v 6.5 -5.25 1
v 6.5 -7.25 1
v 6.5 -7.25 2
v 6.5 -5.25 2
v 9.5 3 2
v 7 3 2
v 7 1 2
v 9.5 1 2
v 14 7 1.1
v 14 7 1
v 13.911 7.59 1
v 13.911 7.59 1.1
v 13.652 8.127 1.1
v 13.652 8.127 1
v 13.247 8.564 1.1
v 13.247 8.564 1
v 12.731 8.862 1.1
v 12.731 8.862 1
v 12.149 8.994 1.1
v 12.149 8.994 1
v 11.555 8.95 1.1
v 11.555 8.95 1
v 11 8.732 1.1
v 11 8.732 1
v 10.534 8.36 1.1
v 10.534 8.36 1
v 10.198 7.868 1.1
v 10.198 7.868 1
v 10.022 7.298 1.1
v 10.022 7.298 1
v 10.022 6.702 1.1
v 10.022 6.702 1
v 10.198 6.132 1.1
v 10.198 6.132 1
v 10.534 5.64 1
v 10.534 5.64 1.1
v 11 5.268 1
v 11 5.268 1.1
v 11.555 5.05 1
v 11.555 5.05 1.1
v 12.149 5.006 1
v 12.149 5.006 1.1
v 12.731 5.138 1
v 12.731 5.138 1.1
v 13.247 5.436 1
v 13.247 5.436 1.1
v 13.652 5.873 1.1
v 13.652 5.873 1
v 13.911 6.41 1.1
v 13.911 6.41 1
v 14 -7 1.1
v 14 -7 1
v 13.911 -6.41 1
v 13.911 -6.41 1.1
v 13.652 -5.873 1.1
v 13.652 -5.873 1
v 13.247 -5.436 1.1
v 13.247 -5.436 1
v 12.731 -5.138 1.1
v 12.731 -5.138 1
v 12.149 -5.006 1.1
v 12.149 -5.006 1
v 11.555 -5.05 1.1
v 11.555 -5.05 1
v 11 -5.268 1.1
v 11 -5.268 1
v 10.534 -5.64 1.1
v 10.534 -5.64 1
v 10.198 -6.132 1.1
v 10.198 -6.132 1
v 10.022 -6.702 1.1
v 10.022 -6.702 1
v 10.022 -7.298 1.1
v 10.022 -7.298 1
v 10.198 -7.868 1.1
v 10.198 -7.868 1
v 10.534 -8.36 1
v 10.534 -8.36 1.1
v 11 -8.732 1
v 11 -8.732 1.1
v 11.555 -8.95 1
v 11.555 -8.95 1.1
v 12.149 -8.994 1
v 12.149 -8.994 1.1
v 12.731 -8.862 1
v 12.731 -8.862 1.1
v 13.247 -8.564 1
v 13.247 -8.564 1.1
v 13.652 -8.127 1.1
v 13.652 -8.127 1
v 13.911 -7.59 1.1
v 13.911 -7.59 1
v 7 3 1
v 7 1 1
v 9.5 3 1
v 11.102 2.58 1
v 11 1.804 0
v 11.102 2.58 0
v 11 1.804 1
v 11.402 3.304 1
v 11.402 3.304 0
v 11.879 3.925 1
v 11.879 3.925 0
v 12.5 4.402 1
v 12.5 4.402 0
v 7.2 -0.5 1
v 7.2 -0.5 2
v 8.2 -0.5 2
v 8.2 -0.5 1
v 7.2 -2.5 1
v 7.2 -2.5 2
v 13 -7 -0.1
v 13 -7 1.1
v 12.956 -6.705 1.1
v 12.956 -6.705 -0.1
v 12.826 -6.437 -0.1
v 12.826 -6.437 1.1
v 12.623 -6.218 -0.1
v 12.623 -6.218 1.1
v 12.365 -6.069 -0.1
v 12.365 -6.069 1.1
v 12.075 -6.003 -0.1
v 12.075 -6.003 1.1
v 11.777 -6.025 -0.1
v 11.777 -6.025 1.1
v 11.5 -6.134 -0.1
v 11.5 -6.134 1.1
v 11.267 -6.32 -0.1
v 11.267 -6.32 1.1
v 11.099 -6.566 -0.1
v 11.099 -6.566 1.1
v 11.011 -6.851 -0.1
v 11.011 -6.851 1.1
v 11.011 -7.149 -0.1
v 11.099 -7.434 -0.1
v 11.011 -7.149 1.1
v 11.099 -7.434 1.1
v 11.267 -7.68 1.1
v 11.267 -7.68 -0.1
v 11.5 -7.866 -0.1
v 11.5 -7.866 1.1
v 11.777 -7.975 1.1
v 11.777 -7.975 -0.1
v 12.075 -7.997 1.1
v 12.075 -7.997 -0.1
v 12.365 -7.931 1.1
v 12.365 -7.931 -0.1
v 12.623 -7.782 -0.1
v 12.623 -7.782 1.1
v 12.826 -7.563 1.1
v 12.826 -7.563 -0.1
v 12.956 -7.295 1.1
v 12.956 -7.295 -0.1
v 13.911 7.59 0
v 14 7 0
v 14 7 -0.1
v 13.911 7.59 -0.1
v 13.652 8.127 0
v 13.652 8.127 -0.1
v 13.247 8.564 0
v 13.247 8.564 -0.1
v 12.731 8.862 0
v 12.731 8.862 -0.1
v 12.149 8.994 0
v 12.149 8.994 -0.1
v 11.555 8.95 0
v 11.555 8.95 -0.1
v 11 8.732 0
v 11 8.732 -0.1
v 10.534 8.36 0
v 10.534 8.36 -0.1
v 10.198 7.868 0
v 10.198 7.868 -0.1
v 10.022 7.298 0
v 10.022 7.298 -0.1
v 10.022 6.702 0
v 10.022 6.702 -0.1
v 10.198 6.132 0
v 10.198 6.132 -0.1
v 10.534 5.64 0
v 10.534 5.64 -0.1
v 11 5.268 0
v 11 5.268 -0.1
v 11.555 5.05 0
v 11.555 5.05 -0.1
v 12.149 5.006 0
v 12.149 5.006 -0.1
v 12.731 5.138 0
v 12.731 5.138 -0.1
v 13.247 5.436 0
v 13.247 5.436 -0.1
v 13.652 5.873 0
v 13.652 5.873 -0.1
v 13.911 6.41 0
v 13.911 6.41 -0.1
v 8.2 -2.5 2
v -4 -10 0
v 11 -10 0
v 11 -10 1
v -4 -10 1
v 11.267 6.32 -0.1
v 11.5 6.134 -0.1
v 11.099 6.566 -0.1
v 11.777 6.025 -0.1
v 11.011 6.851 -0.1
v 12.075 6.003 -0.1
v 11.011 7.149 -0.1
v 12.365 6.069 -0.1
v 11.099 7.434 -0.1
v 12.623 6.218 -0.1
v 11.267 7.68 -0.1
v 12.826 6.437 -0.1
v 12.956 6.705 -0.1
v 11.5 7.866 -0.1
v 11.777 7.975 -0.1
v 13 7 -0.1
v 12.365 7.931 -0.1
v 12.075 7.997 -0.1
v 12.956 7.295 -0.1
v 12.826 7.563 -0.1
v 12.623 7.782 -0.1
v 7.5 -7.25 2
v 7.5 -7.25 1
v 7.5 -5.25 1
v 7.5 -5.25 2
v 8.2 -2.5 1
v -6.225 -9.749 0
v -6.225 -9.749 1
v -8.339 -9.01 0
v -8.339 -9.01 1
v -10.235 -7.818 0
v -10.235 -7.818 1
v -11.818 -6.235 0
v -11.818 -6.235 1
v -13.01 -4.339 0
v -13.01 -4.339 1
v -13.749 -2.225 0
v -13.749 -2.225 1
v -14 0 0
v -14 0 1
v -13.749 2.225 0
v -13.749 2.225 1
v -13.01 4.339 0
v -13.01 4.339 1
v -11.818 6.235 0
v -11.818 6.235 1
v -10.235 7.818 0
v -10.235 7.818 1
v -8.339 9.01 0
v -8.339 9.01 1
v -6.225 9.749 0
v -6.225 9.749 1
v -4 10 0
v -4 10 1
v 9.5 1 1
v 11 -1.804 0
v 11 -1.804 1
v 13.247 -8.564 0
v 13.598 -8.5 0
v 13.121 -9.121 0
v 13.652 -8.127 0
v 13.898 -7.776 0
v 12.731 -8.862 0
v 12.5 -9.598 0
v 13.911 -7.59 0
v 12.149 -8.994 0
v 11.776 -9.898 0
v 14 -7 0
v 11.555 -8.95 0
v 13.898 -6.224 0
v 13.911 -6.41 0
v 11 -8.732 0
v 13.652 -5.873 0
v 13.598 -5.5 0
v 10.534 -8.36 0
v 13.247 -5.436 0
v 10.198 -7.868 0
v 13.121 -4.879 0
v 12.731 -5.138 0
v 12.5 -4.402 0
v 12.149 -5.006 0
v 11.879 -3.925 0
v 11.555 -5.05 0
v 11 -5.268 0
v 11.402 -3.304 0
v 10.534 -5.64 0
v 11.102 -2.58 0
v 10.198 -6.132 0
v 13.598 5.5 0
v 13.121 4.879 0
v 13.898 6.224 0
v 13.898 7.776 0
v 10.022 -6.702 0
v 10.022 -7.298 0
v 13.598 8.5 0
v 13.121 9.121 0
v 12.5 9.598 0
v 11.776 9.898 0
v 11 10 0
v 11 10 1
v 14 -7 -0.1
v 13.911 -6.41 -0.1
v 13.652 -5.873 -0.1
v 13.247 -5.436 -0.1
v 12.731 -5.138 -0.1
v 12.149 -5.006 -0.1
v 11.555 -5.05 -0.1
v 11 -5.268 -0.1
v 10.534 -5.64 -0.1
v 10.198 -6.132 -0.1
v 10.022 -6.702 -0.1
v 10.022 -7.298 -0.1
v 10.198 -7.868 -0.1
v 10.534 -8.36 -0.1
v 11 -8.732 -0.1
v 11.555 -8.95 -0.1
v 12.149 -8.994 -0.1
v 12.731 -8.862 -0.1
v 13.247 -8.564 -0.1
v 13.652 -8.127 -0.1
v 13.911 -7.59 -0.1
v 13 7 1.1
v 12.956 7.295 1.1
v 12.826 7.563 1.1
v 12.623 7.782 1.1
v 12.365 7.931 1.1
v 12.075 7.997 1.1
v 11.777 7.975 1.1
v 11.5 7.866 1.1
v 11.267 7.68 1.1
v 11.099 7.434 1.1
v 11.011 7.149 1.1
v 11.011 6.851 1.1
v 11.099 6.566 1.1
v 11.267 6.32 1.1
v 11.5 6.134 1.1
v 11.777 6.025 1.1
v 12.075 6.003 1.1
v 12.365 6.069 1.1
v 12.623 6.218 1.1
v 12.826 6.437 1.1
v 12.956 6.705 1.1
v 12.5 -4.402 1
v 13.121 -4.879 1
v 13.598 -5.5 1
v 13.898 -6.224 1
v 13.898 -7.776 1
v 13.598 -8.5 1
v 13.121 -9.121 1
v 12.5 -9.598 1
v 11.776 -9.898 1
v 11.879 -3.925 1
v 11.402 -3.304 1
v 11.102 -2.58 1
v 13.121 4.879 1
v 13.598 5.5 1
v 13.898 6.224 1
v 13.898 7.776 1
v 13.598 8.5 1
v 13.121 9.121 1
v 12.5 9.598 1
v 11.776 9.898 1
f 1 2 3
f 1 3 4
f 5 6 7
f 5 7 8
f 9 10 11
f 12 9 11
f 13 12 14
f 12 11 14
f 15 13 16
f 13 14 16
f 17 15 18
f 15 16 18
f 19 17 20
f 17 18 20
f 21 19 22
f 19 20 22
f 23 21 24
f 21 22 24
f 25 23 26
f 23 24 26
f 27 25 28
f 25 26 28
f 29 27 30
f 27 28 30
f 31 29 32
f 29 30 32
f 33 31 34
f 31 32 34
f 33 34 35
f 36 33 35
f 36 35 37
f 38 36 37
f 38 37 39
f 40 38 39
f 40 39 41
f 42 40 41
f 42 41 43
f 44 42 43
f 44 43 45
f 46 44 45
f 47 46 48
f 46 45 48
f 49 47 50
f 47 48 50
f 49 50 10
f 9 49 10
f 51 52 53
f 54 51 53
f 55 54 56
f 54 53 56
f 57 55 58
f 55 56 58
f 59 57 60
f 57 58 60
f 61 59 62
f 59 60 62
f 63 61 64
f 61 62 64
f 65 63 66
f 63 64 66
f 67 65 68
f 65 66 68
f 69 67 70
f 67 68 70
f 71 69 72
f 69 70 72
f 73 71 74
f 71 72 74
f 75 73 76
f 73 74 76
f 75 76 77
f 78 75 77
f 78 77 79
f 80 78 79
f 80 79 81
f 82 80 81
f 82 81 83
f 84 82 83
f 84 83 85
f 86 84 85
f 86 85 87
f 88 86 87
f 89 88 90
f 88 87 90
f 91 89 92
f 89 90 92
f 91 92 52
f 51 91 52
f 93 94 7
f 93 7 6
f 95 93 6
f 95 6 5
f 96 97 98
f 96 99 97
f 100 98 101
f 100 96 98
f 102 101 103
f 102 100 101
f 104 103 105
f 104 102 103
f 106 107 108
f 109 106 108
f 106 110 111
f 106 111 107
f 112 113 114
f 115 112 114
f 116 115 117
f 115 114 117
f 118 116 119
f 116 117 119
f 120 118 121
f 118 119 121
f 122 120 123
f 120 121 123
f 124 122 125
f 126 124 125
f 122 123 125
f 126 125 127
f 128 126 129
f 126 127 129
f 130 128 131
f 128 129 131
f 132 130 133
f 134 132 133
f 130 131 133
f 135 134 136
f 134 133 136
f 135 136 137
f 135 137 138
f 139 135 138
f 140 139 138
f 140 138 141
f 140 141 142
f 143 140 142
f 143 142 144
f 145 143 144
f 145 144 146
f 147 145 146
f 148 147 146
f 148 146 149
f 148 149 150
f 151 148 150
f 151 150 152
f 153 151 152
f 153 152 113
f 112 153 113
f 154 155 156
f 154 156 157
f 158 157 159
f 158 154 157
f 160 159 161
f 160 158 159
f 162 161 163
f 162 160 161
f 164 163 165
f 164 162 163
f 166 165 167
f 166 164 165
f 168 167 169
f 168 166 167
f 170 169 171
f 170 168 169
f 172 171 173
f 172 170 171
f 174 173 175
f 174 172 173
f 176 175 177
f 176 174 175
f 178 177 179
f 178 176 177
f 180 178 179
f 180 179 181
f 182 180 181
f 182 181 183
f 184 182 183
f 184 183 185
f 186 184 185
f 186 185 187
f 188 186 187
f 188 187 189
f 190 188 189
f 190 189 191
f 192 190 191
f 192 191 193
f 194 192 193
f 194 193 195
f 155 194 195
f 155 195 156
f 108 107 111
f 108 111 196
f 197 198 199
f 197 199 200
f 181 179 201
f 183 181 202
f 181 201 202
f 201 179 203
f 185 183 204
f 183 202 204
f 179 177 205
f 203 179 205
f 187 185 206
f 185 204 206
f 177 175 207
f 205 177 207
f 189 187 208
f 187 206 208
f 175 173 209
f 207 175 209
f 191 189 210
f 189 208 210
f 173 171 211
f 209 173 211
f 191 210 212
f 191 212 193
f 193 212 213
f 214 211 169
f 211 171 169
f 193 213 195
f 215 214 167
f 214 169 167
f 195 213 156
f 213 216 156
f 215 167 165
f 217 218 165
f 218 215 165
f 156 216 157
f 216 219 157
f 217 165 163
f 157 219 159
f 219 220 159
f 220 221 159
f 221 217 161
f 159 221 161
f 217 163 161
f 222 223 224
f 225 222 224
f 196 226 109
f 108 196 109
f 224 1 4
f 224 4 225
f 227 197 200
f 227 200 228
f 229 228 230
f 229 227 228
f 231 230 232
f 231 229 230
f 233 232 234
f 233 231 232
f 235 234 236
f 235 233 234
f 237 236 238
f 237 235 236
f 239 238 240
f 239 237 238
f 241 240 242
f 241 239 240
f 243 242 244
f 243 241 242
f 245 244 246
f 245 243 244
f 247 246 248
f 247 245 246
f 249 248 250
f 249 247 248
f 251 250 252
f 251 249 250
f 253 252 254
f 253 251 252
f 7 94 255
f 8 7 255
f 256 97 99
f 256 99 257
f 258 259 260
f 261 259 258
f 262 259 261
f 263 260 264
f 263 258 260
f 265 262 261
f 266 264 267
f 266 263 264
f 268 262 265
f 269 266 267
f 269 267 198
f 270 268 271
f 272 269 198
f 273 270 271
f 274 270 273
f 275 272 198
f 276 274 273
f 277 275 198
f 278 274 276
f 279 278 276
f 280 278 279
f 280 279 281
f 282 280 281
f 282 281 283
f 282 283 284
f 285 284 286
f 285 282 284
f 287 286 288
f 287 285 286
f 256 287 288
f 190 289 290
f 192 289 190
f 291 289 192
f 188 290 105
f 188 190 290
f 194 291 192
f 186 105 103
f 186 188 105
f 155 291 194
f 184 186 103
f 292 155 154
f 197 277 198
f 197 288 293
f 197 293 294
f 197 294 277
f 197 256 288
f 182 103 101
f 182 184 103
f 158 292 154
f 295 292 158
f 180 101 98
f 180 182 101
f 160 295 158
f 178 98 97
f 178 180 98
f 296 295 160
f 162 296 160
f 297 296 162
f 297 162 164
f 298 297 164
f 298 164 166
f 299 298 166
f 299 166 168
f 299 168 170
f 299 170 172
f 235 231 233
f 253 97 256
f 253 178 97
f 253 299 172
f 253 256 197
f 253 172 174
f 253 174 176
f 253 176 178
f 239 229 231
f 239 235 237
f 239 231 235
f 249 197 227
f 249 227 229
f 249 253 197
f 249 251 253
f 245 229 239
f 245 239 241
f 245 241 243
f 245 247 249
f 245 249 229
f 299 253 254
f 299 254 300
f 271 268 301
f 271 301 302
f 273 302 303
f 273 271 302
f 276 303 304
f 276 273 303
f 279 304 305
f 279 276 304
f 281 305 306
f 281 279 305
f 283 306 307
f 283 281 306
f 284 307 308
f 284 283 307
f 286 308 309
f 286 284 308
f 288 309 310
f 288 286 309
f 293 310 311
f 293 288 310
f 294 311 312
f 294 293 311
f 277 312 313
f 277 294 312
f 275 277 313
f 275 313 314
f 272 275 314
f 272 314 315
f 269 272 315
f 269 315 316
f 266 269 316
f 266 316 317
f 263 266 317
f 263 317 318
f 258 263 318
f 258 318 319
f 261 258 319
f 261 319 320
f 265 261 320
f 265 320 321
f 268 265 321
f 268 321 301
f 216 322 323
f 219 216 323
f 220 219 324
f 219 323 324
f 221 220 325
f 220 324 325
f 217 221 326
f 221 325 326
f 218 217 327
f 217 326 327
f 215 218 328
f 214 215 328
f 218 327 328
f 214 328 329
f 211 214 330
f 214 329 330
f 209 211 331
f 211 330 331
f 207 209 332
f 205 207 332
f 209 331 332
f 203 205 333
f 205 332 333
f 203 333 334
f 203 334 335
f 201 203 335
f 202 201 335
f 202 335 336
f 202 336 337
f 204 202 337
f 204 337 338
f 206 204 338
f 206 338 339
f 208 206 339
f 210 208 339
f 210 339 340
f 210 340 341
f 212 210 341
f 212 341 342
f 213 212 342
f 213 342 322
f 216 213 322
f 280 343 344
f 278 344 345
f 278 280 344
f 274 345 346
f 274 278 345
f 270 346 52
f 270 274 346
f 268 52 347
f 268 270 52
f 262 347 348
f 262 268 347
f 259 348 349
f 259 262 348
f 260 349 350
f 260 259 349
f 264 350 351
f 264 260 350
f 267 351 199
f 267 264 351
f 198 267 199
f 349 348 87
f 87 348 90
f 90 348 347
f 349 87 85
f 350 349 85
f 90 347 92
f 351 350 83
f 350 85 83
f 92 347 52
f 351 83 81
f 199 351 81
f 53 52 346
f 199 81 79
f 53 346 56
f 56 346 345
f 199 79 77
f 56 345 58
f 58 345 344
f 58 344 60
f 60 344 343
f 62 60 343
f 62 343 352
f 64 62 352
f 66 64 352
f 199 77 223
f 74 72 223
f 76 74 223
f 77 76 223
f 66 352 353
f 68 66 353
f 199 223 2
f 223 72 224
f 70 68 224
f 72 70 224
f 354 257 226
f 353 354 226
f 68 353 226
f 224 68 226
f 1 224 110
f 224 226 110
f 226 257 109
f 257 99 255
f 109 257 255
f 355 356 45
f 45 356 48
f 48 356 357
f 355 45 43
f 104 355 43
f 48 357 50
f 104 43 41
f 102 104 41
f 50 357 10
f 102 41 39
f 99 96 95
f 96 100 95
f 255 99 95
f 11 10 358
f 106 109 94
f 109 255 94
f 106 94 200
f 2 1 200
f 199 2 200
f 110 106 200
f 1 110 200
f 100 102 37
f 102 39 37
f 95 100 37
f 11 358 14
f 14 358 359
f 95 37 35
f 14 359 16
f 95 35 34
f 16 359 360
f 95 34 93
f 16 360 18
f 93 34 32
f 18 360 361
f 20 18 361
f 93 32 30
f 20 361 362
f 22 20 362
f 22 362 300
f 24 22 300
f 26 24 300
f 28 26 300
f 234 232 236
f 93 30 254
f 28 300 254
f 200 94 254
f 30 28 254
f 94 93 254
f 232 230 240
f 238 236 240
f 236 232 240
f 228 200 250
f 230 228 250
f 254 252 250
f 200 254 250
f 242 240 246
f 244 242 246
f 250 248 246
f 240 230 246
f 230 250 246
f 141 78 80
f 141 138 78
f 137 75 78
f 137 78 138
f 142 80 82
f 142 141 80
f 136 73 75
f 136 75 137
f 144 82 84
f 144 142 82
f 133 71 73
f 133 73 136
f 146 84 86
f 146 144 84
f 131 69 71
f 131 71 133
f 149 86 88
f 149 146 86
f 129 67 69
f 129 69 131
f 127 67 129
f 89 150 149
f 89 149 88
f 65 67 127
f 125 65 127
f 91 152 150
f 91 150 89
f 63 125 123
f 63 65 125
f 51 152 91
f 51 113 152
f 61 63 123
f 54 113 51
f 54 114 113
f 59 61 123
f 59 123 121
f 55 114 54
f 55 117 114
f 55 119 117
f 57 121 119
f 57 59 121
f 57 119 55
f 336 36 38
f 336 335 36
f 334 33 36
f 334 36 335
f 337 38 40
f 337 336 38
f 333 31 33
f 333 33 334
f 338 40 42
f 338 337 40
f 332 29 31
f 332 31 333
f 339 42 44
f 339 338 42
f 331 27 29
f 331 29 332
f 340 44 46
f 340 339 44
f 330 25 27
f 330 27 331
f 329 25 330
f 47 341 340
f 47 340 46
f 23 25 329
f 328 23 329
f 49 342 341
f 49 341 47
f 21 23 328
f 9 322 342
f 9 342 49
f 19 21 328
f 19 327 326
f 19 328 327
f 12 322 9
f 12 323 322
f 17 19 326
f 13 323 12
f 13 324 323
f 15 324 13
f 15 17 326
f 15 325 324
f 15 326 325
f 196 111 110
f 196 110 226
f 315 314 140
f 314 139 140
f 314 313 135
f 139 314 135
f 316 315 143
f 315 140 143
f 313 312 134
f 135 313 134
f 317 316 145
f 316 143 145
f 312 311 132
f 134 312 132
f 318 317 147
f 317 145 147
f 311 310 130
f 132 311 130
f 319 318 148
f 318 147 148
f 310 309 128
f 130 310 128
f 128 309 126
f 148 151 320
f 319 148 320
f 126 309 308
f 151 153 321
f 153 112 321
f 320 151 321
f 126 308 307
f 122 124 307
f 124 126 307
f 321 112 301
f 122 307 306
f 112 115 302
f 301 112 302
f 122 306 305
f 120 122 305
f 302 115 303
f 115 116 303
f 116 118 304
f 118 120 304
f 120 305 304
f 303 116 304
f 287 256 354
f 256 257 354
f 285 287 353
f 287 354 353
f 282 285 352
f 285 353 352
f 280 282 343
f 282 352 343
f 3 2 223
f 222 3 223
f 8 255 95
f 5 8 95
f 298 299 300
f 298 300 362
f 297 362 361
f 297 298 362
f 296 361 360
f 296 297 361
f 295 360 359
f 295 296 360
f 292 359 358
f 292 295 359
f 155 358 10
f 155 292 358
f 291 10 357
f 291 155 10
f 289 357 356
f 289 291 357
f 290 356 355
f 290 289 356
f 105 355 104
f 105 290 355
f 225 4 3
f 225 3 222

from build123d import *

# Parameters (mm, degrees)
SKETCH1_R                = 1
BOSS_EXTRUDE1_DEPTH      = 1
FILLET1_R                = 3
SKETCH2_R                = 2
BOSS_EXTRUDE2_DEPTH      = 0.1
BOSS_EXTRUDE2_DEPTH_BACK = 1.1
SKETCH3_R                = 1
CUT_EXTRUDE1_DEPTH       = 2
SKETCH4_W                = 2.5
SKETCH4_H                = 2
SKETCH4_W_2              = 1
BOSS_EXTRUDE3_DEPTH      = 1


with BuildPart() as part:
    # Sketch1 → Boss-Extrude1 (new body)
    with BuildSketch(Plane.XY):
        with BuildLine():
            Line((11, 4), (11, -4))
            ThreePointArc((11, -4), (14, -7), (11, -10))
            Line((11, -10), (-4, -10))
            ThreePointArc((-4, -10), (-14, 0), (-4, 10))
            Line((-4, 10), (11, 10))
            ThreePointArc((11, 10), (14, 7), (11, 4))
        make_face()
        with Locations((12, 7)):
            Circle(SKETCH1_R, mode=Mode.SUBTRACT)
        with Locations((12, -7)):
            Circle(SKETCH1_R, mode=Mode.SUBTRACT)
    extrude(amount=BOSS_EXTRUDE1_DEPTH)

    # Fillet1
    fillet1_edges = [part.edges().sort_by_distance(p)[0] for p in [
        (11, 4, 0.5),
        (11, -4, 0.5),
    ]]
    fillet(fillet1_edges, radius=FILLET1_R)

    # Sketch2 → Boss-Extrude2 (add, two sides)
    with BuildSketch(Plane.XY.offset(1)) as boss_extrude2_sk:
        with Locations((12, 7)):
            Circle(SKETCH2_R)
        with Locations((12, -7)):
            Circle(SKETCH2_R)
    extrude(amount=BOSS_EXTRUDE2_DEPTH)
    extrude(boss_extrude2_sk.sketch, amount=-BOSS_EXTRUDE2_DEPTH_BACK)

    # Sketch3 → Cut-Extrude1 (cut)
    with BuildSketch(Plane.XY.offset(1.1)):
        with Locations((12, 7)):
            Circle(SKETCH3_R)
        with Locations((12, -7)):
            Circle(SKETCH3_R)
    extrude(amount=-CUT_EXTRUDE1_DEPTH, mode=Mode.SUBTRACT)

    # Sketch4 → Boss-Extrude3 (add)
    with BuildSketch(Plane.XY.offset(1)):
        with Locations((8.25, 2)):
            Rectangle(SKETCH4_W, SKETCH4_H)
        with Locations((7.7, -1.5)):
            Rectangle(SKETCH4_W_2, SKETCH4_H)
        with Locations((7, -6.25)):
            Rectangle(SKETCH4_W_2, SKETCH4_H)
    extrude(amount=BOSS_EXTRUDE3_DEPTH)


solid = part.part
